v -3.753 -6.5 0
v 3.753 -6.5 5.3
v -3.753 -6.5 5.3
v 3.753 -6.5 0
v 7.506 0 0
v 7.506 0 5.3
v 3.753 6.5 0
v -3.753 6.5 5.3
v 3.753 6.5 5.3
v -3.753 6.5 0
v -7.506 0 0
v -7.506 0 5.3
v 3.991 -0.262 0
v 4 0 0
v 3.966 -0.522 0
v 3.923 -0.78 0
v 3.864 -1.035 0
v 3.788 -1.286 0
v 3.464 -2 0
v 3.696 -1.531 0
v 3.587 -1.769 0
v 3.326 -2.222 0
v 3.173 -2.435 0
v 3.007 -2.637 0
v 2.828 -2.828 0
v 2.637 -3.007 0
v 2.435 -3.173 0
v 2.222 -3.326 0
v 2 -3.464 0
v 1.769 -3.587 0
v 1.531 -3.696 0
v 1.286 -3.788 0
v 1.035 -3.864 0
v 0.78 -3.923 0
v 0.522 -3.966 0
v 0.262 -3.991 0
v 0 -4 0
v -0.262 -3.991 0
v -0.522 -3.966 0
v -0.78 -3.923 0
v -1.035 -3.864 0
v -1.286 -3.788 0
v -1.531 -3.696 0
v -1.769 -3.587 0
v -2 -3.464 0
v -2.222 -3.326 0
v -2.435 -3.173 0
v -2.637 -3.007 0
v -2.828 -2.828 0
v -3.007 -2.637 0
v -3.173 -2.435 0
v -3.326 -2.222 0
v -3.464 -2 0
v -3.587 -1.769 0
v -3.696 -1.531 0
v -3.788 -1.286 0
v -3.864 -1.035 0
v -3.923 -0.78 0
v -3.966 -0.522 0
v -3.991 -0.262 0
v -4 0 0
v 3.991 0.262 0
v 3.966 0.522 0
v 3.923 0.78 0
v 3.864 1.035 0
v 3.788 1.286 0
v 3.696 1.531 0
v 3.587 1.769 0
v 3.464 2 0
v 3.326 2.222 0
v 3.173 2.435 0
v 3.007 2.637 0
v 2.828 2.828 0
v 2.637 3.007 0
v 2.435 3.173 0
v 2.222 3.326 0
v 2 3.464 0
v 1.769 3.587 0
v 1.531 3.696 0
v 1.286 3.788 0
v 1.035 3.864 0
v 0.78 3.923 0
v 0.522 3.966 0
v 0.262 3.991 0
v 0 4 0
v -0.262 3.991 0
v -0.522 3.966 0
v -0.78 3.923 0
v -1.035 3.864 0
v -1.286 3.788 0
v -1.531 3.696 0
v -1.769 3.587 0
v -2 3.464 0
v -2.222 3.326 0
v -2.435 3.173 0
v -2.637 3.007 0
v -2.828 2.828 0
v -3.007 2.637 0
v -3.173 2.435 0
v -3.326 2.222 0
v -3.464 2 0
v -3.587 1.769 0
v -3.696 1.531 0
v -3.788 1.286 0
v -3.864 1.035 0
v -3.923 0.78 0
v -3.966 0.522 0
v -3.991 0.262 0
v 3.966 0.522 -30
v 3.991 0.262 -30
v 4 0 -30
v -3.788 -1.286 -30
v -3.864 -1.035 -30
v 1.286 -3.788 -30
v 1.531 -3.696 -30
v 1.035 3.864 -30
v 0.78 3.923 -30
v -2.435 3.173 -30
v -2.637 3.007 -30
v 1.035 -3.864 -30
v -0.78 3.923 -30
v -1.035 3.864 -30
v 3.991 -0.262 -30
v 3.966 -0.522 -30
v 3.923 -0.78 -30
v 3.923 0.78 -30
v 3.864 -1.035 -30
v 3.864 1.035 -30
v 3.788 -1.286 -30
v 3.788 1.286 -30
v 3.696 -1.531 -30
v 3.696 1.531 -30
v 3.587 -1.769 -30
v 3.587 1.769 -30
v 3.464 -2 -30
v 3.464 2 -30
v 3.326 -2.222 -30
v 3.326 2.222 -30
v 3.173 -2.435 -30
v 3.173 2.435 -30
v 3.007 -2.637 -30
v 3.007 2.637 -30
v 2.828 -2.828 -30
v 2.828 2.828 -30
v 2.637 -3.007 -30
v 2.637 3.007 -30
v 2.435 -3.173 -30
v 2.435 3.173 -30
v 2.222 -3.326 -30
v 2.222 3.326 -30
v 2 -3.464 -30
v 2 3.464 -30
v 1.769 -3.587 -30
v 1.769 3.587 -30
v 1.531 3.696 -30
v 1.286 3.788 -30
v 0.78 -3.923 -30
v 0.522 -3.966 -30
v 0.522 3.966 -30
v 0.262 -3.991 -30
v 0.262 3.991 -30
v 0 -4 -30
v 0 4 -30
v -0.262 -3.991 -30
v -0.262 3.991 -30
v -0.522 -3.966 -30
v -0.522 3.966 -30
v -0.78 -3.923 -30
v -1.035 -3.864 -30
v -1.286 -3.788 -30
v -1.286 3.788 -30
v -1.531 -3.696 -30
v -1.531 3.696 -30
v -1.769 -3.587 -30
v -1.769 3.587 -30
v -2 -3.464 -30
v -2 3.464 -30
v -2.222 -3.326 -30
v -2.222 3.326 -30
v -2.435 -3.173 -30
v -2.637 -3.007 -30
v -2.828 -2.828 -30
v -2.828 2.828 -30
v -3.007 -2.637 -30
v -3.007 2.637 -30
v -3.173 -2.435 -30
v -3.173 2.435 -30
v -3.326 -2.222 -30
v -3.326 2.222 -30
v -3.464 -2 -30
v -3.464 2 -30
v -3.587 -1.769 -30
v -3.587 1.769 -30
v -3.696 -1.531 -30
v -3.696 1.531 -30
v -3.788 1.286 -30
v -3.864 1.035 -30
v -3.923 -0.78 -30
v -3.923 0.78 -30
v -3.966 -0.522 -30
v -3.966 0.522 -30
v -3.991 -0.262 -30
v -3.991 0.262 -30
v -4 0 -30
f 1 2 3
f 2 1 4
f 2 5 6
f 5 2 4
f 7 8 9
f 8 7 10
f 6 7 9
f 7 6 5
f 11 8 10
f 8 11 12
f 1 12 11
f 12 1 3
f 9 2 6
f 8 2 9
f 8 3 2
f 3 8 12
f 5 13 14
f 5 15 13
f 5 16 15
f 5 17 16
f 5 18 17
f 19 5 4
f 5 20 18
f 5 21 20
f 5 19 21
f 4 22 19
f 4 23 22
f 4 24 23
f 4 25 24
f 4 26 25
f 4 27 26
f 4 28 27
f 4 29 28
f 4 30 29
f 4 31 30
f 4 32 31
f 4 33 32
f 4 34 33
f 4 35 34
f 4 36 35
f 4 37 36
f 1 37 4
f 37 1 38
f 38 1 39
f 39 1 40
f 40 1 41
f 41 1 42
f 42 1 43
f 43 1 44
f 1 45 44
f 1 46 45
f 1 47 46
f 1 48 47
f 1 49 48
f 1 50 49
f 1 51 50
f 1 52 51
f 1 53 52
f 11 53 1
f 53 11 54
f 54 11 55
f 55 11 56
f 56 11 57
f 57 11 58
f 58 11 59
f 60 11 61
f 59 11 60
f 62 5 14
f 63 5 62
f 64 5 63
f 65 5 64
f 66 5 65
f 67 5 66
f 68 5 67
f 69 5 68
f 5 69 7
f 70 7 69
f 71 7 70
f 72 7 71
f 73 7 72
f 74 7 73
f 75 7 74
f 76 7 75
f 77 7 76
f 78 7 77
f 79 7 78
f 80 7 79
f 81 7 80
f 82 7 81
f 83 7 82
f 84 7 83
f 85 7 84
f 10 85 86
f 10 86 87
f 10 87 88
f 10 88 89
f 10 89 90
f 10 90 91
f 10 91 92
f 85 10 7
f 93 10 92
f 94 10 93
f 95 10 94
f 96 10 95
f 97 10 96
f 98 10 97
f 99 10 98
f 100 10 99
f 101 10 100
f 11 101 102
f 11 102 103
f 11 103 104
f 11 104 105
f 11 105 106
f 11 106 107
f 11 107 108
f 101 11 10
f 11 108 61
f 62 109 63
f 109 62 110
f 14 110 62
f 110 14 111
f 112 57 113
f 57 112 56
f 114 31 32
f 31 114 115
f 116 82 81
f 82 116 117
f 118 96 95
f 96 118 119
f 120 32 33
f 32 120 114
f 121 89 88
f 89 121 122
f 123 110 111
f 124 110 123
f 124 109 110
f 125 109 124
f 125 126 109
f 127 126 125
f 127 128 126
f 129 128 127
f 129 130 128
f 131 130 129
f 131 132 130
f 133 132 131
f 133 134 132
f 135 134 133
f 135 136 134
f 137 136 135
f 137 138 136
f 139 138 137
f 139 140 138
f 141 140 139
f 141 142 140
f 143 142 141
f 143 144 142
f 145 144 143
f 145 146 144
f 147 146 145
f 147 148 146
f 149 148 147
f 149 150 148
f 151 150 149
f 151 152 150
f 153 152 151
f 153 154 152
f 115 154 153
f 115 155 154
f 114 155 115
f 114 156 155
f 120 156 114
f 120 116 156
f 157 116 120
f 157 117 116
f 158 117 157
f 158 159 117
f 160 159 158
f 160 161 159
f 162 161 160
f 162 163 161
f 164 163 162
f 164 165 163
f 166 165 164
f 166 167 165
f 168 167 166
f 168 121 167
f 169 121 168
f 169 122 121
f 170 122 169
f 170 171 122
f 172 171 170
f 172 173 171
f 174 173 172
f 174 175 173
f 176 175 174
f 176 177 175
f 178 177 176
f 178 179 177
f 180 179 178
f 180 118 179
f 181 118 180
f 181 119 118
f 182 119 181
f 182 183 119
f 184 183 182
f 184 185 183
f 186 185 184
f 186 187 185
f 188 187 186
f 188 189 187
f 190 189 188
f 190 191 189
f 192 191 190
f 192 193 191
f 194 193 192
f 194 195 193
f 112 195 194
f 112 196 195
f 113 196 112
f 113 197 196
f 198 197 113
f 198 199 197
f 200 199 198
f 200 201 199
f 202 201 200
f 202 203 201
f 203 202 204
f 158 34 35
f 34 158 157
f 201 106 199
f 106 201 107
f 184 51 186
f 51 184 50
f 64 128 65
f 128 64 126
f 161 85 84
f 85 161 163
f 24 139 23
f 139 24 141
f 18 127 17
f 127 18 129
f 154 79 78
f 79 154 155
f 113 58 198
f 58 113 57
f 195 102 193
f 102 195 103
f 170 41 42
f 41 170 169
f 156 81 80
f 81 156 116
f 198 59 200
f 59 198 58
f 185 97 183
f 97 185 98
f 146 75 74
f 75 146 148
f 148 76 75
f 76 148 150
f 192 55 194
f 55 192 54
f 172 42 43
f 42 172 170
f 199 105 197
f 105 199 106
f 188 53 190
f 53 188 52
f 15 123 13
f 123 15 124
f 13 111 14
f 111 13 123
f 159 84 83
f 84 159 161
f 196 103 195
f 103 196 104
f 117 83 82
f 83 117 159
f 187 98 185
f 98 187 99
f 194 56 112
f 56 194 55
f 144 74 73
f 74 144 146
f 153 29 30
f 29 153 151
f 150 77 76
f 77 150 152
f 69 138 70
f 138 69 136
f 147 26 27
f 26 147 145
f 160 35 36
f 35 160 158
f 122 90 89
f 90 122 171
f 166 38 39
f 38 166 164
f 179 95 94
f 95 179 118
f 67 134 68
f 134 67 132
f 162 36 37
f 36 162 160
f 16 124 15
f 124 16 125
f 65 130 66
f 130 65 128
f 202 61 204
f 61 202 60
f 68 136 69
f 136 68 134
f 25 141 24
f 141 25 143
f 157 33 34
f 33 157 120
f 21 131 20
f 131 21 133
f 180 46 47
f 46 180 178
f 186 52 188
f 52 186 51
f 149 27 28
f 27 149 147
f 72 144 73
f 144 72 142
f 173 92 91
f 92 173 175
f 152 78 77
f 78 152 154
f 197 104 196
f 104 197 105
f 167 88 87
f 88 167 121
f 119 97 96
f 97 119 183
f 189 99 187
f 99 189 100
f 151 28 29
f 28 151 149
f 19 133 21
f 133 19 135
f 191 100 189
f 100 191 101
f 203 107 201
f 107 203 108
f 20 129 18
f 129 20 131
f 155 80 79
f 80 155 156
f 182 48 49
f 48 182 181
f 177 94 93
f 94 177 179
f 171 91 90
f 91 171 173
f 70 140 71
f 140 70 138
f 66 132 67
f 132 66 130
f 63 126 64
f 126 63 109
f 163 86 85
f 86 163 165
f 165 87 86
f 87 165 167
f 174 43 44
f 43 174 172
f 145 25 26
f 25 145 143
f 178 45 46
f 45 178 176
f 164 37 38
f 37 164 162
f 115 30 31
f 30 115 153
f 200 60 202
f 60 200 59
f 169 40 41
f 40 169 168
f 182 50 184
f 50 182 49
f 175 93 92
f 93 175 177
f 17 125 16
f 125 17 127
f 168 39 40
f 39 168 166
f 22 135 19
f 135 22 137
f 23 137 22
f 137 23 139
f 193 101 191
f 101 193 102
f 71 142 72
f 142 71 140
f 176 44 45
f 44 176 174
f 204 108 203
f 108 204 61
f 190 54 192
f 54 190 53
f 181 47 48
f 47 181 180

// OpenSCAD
// M8 六角ボルト(ねじ山省略)
// 頭部底面が z=0、頭部は +Z 側、シャンクは -Z 側

$fn = 96;

// パラメータ
across_flats = 13;      // 対辺距離 [mm]
head_height  = 5.3;     // 頭部高さ [mm]
shank_d      = 8;       // シャンク直径 [mm]
shank_len    = 30;      // シャンク長さ [mm]

// 対辺距離 -> 外接円直径
across_corners = across_flats / cos(30);

module hex_head() {
    // 六角柱: z=0 から z=head_height
    cylinder(d = across_corners, h = head_height, $fn = 6);
}

module shank() {
    // 円柱: z=-shank_len から z=0
    translate([0, 0, -shank_len])
        cylinder(d = shank_d, h = shank_len);
}

module m8_hex_bolt() {
    union() {
        hex_head();
        shank();
    }
}

m8_hex_bolt();
